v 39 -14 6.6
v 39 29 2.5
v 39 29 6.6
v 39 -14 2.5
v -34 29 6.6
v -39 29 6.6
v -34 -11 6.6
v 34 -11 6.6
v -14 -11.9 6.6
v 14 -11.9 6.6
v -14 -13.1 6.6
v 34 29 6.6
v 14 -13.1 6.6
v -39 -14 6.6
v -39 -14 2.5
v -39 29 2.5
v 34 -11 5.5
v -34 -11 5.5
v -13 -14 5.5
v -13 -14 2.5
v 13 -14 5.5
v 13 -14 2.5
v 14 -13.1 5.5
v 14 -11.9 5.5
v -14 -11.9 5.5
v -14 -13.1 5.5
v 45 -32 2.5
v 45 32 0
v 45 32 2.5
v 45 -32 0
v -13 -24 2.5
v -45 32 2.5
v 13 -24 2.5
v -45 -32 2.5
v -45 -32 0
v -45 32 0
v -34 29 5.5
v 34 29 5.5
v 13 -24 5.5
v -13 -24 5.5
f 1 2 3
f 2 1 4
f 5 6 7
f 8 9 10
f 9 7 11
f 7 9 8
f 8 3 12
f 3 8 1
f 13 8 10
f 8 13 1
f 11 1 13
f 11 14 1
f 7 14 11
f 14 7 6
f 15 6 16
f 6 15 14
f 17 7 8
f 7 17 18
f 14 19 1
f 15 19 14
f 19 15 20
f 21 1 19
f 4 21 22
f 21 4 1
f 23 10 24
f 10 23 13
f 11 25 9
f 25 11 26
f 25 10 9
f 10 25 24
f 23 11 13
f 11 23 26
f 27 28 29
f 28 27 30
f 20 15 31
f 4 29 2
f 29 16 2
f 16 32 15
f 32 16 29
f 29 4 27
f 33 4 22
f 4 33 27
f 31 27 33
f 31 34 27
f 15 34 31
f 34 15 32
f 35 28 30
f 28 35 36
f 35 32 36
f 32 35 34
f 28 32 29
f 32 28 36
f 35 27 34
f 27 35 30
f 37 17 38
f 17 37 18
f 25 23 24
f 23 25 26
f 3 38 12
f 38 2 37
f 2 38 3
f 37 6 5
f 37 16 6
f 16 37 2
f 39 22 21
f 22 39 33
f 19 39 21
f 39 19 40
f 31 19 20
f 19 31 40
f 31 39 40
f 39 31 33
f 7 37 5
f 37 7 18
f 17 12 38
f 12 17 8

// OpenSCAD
// Parameters
$fn = 64;

// Base slab
base_width = 90;
base_depth = 64;
base_thickness = 2.5;

// Rear raised pad layout
rear_clearance = 3;
side_clearance = 6;
front_exposed_strip_depth = 18;
raised_height = 3.0;
raised_width = base_width - 2 * side_clearance;
raised_depth = base_depth - rear_clearance - front_exposed_strip_depth;

// Stepped forward continuation
continuation_width = 26;
continuation_depth = 10;
continuation_x_offset = 0;
continuation_height = raised_height;

// Left and right raised strips
side_strip_width = 5;
side_strip_depth = raised_depth;
side_strip_height = 1.1;

// Thin transverse raised feature
transverse_rib_width = raised_width;
transverse_rib_depth = 3;
transverse_rib_height = 1.1;
transverse_rib_front_setback = 0;

// Real opening through transverse feature only
rib_opening_width = 28;
rib_opening_depth = 1.2;

// Boolean robustness
join_overlap = 0.02;
plan_overlap = 0.05;
cut_clearance = 0.05;

// Derived positions
base_top_z = base_thickness;
raised_top_z = base_top_z + raised_height;
rear_y = base_depth / 2 - rear_clearance;
raised_front_y = rear_y - raised_depth;
rib_center_y = raised_front_y + transverse_rib_front_setback + transverse_rib_depth / 2;

// Centered box with bottom at zmin
module centered_box(w, d, h, xpos = 0, ypos = 0, zmin = 0) {
    translate([xpos, ypos, zmin + h / 2])
        cube([w, d, h], center = true);
}

// Added solid with slight vertical overlap
module added_box(w, d, h, xpos = 0, ypos = 0, zmin = 0) {
    centered_box(w, d, h + join_overlap, xpos, ypos, zmin - join_overlap);
}

// Rear-aligned rectangular solid
module rear_aligned_box(w, d, h, xpos = 0, y_rear = 0, zmin = 0) {
    added_box(w, d, h, xpos, y_rear - d / 2, zmin);
}

// Thin base slab
module base_slab() {
    centered_box(base_width, base_depth, base_thickness, 0, 0, 0);
}

// Main rear raised rectangular portion
module rear_raised_pad() {
    rear_aligned_box(raised_width, raised_depth, raised_height, 0, rear_y, base_top_z);
}

// Aligned continuation creating the stepped lower/front outline
module forward_continuation() {
    centered_box(
        continuation_width,
        continuation_depth + plan_overlap,
        continuation_height + join_overlap,
        continuation_x_offset,
        raised_front_y - continuation_depth / 2 + plan_overlap / 2,
        base_top_z - join_overlap
    );
}

// Narrow raised side strip
module side_strip(xsign = 1) {
    xpos = xsign * (raised_width / 2 - side_strip_width / 2);
    rear_aligned_box(side_strip_width, side_strip_depth, side_strip_height, xpos, rear_y, raised_top_z);
}

// Transverse raised rib with a real internal opening
module transverse_rib_with_opening() {
    difference() {
        added_box(transverse_rib_width, transverse_rib_depth, transverse_rib_height, 0, rib_center_y, raised_top_z);

        translate([0, rib_center_y, raised_top_z + transverse_rib_height / 2])
            cube(
                [
                    rib_opening_width,
                    rib_opening_depth,
                    transverse_rib_height + join_overlap + 2 * cut_clearance
                ],
                center = true
            );
    }
}

// Main model
union() {
    base_slab();

    // Added solids on top of the base
    rear_raised_pad();
    forward_continuation();

    // Higher raised strips and transverse feature
    side_strip(-1);
    side_strip(1);
    transverse_rib_with_opening();
}
